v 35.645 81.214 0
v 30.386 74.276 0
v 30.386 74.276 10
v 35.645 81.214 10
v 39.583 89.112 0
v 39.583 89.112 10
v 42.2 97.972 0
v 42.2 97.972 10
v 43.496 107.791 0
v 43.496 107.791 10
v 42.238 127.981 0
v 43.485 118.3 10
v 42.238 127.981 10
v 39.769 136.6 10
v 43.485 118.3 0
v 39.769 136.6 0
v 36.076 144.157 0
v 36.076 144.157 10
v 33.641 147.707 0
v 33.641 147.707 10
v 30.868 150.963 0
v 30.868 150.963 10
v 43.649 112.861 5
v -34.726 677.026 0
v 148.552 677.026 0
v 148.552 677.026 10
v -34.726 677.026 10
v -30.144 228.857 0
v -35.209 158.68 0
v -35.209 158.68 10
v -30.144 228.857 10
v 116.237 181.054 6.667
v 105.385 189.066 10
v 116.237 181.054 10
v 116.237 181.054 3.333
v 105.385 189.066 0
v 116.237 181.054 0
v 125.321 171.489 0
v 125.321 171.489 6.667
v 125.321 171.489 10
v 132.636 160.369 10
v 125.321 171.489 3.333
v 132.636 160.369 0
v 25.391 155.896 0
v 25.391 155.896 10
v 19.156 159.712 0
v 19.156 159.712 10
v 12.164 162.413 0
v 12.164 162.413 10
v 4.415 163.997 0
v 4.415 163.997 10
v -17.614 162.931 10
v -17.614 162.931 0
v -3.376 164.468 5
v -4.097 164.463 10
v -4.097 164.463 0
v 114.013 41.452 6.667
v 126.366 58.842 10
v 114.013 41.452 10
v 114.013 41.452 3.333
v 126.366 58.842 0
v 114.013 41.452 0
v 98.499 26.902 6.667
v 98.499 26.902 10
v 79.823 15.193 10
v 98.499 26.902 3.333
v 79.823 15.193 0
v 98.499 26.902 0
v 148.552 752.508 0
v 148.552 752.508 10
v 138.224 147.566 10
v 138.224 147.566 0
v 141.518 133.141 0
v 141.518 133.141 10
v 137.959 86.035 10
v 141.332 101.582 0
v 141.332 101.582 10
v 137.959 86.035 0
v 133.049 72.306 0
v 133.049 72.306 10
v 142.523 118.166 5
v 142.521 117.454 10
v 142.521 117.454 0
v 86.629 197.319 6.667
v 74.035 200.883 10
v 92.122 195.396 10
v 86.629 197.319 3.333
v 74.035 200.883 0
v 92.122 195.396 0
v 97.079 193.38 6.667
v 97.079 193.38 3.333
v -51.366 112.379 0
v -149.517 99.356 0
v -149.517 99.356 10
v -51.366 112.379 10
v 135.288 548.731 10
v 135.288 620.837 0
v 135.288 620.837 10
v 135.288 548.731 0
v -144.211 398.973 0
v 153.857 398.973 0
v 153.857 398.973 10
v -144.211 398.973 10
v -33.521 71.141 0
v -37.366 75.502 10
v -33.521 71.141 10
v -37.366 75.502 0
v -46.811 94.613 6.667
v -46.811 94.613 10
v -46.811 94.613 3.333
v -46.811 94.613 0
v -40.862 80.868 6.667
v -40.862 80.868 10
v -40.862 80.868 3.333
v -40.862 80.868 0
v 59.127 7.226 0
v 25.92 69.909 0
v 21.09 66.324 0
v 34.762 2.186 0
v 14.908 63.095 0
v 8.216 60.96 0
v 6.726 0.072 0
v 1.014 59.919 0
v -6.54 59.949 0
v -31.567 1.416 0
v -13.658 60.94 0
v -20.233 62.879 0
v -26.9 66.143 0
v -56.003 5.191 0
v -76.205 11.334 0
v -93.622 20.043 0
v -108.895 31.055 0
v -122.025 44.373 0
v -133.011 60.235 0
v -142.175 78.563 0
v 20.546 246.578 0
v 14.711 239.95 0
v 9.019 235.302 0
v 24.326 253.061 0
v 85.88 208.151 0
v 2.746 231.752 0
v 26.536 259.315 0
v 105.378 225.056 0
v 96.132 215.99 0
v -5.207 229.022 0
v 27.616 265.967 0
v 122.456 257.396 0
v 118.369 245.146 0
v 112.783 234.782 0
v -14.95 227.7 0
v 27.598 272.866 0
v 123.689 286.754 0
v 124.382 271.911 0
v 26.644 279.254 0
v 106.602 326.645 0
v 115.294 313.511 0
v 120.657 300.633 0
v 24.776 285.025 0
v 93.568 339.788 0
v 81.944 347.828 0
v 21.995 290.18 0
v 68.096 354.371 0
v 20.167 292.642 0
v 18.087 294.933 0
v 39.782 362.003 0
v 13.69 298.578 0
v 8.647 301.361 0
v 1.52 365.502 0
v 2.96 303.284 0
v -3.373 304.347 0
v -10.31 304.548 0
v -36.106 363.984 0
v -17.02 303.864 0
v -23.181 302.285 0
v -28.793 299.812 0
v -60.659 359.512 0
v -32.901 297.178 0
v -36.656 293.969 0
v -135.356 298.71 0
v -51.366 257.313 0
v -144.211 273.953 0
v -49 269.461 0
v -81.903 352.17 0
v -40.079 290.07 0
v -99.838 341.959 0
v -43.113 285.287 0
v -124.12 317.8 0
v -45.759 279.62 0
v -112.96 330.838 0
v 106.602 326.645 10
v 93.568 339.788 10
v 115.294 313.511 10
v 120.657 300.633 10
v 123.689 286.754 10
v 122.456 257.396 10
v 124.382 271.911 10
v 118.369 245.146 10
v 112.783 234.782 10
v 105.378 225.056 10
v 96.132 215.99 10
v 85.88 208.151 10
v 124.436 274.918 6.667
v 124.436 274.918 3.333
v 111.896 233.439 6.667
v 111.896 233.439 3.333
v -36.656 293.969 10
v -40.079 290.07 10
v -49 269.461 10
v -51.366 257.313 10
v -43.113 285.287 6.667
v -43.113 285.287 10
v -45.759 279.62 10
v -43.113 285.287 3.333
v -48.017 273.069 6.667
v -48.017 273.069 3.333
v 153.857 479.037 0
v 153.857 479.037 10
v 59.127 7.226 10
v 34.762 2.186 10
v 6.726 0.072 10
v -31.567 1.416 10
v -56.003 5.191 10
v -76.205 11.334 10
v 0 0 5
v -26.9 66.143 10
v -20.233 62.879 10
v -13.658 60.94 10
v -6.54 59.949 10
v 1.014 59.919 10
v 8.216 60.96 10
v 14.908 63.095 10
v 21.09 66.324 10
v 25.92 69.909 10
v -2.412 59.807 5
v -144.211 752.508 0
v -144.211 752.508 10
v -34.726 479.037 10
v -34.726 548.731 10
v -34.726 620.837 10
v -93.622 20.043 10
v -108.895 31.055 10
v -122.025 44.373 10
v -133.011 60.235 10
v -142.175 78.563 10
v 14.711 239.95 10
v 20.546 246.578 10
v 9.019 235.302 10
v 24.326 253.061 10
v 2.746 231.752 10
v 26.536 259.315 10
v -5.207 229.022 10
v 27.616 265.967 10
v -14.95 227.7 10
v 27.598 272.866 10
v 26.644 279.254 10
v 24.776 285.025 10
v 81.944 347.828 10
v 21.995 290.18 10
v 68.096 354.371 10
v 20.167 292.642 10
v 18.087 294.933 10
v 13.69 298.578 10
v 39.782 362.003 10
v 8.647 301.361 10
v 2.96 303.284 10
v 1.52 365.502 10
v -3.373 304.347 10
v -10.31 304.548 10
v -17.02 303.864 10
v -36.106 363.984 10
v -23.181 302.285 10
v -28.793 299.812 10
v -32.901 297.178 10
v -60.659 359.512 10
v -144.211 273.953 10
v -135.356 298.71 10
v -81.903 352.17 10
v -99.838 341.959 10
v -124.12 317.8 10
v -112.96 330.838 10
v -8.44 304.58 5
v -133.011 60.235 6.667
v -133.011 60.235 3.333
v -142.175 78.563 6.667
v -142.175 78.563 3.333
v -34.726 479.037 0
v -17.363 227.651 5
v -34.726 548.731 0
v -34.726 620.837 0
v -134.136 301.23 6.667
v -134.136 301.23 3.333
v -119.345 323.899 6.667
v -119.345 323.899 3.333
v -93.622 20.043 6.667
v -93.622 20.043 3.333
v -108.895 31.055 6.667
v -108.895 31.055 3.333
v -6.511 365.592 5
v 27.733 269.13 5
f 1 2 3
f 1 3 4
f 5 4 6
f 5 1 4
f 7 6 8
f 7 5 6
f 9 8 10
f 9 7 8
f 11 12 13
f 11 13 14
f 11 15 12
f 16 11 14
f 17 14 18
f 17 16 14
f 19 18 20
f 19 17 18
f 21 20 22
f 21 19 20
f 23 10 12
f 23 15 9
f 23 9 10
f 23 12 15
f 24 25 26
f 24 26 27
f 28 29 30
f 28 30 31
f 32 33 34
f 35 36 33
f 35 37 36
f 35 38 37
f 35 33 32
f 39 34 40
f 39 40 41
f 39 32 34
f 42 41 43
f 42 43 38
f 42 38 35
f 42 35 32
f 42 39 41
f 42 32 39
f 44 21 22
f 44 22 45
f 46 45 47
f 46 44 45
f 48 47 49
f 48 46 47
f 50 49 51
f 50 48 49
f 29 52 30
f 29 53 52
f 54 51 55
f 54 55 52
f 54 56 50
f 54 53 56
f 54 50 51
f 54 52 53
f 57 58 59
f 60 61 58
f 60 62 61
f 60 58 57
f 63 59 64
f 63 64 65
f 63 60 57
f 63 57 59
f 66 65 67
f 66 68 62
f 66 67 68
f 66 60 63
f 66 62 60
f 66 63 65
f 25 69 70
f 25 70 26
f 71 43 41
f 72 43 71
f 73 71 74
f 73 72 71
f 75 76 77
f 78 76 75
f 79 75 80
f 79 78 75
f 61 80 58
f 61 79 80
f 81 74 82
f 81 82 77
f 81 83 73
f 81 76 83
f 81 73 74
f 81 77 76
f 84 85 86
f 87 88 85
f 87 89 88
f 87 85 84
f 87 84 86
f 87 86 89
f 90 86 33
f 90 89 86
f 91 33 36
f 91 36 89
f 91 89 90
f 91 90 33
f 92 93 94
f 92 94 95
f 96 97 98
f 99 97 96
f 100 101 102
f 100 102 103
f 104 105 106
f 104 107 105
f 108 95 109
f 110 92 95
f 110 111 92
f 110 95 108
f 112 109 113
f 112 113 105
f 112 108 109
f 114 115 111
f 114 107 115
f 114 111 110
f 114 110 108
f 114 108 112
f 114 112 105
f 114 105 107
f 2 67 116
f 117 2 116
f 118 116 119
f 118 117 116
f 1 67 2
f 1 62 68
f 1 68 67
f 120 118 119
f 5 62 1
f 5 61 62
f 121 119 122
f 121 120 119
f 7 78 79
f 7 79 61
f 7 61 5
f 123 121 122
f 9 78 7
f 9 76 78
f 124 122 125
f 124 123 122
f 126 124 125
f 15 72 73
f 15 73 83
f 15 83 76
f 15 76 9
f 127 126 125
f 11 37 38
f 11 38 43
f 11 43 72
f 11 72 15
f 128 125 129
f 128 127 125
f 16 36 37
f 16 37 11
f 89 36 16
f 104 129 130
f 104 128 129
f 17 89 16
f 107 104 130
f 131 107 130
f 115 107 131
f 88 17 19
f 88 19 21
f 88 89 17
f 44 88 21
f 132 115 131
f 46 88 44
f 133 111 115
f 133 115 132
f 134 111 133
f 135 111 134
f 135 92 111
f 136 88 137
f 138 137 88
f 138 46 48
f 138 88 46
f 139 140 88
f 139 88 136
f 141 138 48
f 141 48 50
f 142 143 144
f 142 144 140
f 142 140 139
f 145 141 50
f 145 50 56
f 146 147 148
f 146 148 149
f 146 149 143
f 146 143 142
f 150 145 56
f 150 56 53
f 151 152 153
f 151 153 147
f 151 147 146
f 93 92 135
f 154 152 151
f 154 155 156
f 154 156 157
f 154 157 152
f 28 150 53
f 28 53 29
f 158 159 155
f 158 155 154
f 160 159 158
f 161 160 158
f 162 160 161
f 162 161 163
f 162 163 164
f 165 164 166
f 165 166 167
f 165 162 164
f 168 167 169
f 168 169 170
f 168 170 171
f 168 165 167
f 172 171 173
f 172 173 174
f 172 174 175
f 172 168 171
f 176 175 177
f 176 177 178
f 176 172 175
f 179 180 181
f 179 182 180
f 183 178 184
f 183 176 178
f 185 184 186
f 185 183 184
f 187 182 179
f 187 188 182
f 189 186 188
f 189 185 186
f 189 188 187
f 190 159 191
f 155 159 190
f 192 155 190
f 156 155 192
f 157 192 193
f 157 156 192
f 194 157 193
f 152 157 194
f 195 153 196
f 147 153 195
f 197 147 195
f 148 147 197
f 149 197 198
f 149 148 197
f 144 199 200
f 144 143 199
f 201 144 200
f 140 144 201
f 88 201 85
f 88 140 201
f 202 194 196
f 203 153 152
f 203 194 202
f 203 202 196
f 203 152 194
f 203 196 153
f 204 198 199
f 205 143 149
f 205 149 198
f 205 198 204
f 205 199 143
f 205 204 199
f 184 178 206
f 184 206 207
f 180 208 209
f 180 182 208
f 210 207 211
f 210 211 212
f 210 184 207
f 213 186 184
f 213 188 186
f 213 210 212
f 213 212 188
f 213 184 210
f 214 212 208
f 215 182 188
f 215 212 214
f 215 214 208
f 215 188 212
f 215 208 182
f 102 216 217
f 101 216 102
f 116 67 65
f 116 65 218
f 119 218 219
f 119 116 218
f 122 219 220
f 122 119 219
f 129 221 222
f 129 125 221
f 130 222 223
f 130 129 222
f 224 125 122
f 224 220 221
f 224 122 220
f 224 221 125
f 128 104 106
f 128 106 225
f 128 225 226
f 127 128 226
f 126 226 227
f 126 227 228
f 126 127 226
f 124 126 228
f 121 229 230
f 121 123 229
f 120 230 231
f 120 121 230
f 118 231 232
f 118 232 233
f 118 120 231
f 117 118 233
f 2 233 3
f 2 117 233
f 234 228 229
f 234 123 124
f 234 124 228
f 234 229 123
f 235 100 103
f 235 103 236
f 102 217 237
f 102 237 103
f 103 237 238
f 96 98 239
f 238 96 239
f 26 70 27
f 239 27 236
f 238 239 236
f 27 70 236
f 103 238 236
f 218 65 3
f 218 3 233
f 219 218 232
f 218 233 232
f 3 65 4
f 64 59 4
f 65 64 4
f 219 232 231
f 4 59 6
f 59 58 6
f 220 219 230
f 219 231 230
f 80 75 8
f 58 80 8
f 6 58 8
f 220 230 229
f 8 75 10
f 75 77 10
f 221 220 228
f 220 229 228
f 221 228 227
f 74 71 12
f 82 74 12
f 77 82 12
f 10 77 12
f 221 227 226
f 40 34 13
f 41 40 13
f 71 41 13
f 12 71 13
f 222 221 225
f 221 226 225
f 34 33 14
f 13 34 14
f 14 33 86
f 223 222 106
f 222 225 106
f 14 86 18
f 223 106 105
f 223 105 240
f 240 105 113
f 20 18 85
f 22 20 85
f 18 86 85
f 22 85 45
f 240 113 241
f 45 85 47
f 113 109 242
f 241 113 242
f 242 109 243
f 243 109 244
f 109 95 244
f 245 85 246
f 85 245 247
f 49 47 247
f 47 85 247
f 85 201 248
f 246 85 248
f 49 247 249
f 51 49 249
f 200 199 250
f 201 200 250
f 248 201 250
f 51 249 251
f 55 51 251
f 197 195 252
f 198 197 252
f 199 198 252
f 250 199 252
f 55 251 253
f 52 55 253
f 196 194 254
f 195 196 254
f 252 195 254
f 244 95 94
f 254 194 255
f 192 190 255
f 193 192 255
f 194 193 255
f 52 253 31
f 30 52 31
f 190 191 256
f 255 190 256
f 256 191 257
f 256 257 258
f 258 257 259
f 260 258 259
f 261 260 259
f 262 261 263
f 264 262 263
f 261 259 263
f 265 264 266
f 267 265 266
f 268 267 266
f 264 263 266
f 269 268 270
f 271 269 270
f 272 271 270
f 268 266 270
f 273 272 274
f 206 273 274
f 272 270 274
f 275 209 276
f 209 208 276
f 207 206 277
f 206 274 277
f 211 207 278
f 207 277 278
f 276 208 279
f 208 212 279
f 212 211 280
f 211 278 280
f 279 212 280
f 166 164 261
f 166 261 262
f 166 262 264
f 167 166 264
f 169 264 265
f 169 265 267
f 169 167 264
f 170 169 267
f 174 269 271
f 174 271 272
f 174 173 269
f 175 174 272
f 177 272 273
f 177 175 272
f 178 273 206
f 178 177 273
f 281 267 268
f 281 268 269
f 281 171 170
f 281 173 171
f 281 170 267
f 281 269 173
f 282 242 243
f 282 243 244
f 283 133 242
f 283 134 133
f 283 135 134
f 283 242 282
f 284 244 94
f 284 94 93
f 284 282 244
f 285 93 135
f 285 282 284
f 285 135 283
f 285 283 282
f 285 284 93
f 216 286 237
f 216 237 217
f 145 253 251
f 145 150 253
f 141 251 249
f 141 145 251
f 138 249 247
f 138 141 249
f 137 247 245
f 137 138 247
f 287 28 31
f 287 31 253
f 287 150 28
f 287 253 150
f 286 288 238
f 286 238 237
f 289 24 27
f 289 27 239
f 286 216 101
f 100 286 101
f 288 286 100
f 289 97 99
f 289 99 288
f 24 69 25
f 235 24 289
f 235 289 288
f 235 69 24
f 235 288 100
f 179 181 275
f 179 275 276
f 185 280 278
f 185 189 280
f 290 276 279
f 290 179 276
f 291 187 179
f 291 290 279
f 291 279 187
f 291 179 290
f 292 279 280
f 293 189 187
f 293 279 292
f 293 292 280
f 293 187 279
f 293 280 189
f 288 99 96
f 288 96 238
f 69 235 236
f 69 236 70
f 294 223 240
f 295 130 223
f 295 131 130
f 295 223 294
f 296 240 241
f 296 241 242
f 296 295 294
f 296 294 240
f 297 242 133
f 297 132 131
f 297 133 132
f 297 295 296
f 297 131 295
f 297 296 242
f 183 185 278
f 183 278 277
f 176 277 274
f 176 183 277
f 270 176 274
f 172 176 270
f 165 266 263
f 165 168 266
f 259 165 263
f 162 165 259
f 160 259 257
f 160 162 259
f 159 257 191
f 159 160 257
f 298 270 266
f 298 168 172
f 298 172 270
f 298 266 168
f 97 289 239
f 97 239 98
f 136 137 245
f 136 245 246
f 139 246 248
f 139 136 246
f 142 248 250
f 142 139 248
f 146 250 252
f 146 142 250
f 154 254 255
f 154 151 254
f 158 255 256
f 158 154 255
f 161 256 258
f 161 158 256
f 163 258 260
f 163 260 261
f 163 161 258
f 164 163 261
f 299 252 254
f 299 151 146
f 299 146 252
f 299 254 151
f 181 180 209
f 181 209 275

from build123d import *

# Parameters (mm, degrees)
BOSS_EXTRUDE1_DEPTH   = 10
BOSS_EXTRUDE1_2_DEPTH = 10


with BuildPart() as part:
    # Sketch1 → Boss-Extrude1 (new body)
    with BuildSketch(Plane.XY):
        Polygon((-144.211144, 752.50763293), (148.55197, 752.50763293), (148.55197, 677.02589093), (-34.726412, 677.02589093), (-34.726412, 620.83659693), (135.288398, 620.83659693), (135.288398, 548.73101093), (-34.726412, 548.73101093), (-34.726412, 479.03698093), (153.857396, 479.03698093), (153.857396, 398.97330493), (-144.211144, 398.97330493), align=None)
    extrude(amount=BOSS_EXTRUDE1_DEPTH)


with BuildPart() as body_2:
    # Sketch1 → Boss-Extrude1 2 (new body)
    with BuildSketch(Plane.XY):
        with BuildLine():
            Line((-51.366168, 257.313168), (-144.211144, 273.952938))
            add(Edge.make_bspline(
                [(-144.211144, 273.952938), (-136.494162, 303.534714), (-121.703274, 326.20336), (-99.838466, 341.958862)],
                knots=[0, 0, 0, 0, 1, 1, 1, 1], degree=3))
            add(Edge.make_bspline(
                [(-99.838466, 341.958862), (-77.812896, 357.714378), (-46.703804, 365.592122), (-6.511176, 365.592122)],
                knots=[0, 0, 0, 0, 1, 1, 1, 1], degree=3))
            add(Edge.make_bspline(
                [(-6.511176, 365.592122), (39.62994, 365.592122), (72.989812, 356.9909), (93.568468, 339.788456)],
                knots=[0, 0, 0, 0, 1, 1, 1, 1], degree=3))
            add(Edge.make_bspline(
                [(93.568468, 339.788456), (114.147082, 322.585998), (124.436396, 300.962382), (124.436396, 274.91758)],
                knots=[0, 0, 0, 0, 1, 1, 1, 1], degree=3))
            add(Edge.make_bspline(
                [(124.436396, 274.91758), (124.436396, 259.644378), (120.25636, 245.818104), (111.896288, 233.438772)],
                knots=[0, 0, 0, 0, 1, 1, 1, 1], degree=3))
            add(Edge.make_bspline(
                [(111.896288, 233.438772), (103.536216, 221.05944), (90.915734, 210.207438), (74.034828, 200.882752)],
                knots=[0, 0, 0, 0, 1, 1, 1, 1], degree=3))
            add(Edge.make_bspline(
                [(74.034828, 200.882752), (87.700312, 197.506554), (98.150402, 193.567668), (105.38507, 189.066094)],
                knots=[0, 0, 0, 0, 1, 1, 1, 1], degree=3))
            add(Edge.make_bspline(
                [(105.38507, 189.066094), (117.121312, 181.831426), (126.204848, 172.26559), (132.635664, 160.368586)],
                knots=[0, 0, 0, 0, 1, 1, 1, 1], degree=3))
            add(Edge.make_bspline(
                [(132.635664, 160.368586), (139.22727, 148.632316), (142.52308, 134.564906), (142.52308, 118.166328)],
                knots=[0, 0, 0, 0, 1, 1, 1, 1], degree=3))
            add(Edge.make_bspline(
                [(142.52308, 118.166328), (142.52308, 97.587686), (137.137266, 77.812896), (126.365638, 58.841986)],
                knots=[0, 0, 0, 0, 1, 1, 1, 1], degree=3))
            add(Edge.make_bspline(
                [(126.365638, 58.841986), (115.59401, 40.031838), (100.079658, 25.4821), (79.822582, 15.192814)],
                knots=[0, 0, 0, 0, 1, 1, 1, 1], degree=3))
            add(Edge.make_bspline(
                [(79.822582, 15.192814), (59.565478, 5.064276), (32.957946, 0), (0, 0)],
                knots=[0, 0, 0, 0, 1, 1, 1, 1], degree=3))
            add(Edge.make_bspline(
                [(0, 0), (-32.154108, 0), (-57.555834, 3.778096), (-76.205206, 11.334288)],
                knots=[0, 0, 0, 0, 1, 1, 1, 1], degree=3))
            add(Edge.make_bspline(
                [(-76.205206, 11.334288), (-94.693816, 18.890508), (-109.967018, 29.9033), (-122.024798, 44.372636)],
                knots=[0, 0, 0, 0, 1, 1, 1, 1], degree=3))
            add(Edge.make_bspline(
                [(-122.024798, 44.372636), (-133.92183, 59.002776), (-143.085754, 77.33061), (-149.51657, 99.356152)],
                knots=[0, 0, 0, 0, 1, 1, 1, 1], degree=3))
            Line((-149.51657, 99.356152), (-51.366168, 112.378574))
            add(Edge.make_bspline(
                [(-51.366168, 112.378574), (-47.50767, 92.603812), (-41.559154, 78.85794), (-33.520634, 71.140958)],
                knots=[0, 0, 0, 0, 1, 1, 1, 1], degree=3))
            add(Edge.make_bspline(
                [(-33.520634, 71.140958), (-25.321338, 63.584738), (-14.95165, 59.806628), (-2.411556, 59.806628)],
                knots=[0, 0, 0, 0, 1, 1, 1, 1], degree=3))
            add(Edge.make_bspline(
                [(-2.411556, 59.806628), (10.771628, 59.806628), (21.704032, 64.62974), (30.385642, 74.275978)],
                knots=[0, 0, 0, 0, 1, 1, 1, 1], degree=3))
            add(Edge.make_bspline(
                [(30.385642, 74.275978), (39.228028, 83.922202), (43.649214, 96.783848), (43.649214, 112.860888)],
                knots=[0, 0, 0, 0, 1, 1, 1, 1], degree=3))
            add(Edge.make_bspline(
                [(43.649214, 112.860888), (43.649214, 129.259494), (39.388804, 141.960364), (30.86797, 150.963498)],
                knots=[0, 0, 0, 0, 1, 1, 1, 1], degree=3))
            add(Edge.make_bspline(
                [(30.86797, 150.963498), (22.507898, 159.966632), (11.09318, 164.468206), (-3.376156, 164.468206)],
                knots=[0, 0, 0, 0, 1, 1, 1, 1], degree=3))
            add(Edge.make_bspline(
                [(-3.376156, 164.468206), (-11.093138, 164.468206), (-21.70399, 162.538964), (-35.208726, 158.680494)],
                knots=[0, 0, 0, 0, 1, 1, 1, 1], degree=3))
            Line((-35.208726, 158.680494), (-30.144478, 228.856796))
            add(Edge.make_bspline(
                [(-30.144478, 228.856796), (-24.678262, 228.052944), (-20.417838, 227.651018), (-17.363192, 227.651018)],
                knots=[0, 0, 0, 0, 1, 1, 1, 1], degree=3))
            add(Edge.make_bspline(
                [(-17.363192, 227.651018), (-4.501546, 227.651018), (6.189694, 231.75068), (14.710528, 239.94999)],
                knots=[0, 0, 0, 0, 1, 1, 1, 1], degree=3))
            add(Edge.make_bspline(
                [(14.710528, 239.94999), (23.39211, 248.149272), (27.732908, 257.875884), (27.732908, 269.129826)],
                knots=[0, 0, 0, 0, 1, 1, 1, 1], degree=3))
            add(Edge.make_bspline(
                [(27.732908, 269.129826), (27.732908, 279.901454), (24.5175, 288.502676), (18.086684, 294.933492)],
                knots=[0, 0, 0, 0, 1, 1, 1, 1], degree=3))
            add(Edge.make_bspline(
                [(18.086684, 294.933492), (11.655854, 301.364308), (2.813482, 304.57973), (-8.44046, 304.57973)],
                knots=[0, 0, 0, 0, 1, 1, 1, 1], degree=3))
            add(Edge.make_bspline(
                [(-8.44046, 304.57973), (-20.015912, 304.57973), (-29.420972, 301.04277), (-36.655654, 293.96885)],
                knots=[0, 0, 0, 0, 1, 1, 1, 1], degree=3))
            add(Edge.make_bspline(
                [(-36.655654, 293.96885), (-43.890322, 287.055734), (-48.793836, 274.837164), (-51.366168, 257.313168)],
                knots=[0, 0, 0, 0, 1, 1, 1, 1], degree=3))
        make_face()
    extrude(amount=BOSS_EXTRUDE1_2_DEPTH)


solid = Compound([part.part, body_2.part])
